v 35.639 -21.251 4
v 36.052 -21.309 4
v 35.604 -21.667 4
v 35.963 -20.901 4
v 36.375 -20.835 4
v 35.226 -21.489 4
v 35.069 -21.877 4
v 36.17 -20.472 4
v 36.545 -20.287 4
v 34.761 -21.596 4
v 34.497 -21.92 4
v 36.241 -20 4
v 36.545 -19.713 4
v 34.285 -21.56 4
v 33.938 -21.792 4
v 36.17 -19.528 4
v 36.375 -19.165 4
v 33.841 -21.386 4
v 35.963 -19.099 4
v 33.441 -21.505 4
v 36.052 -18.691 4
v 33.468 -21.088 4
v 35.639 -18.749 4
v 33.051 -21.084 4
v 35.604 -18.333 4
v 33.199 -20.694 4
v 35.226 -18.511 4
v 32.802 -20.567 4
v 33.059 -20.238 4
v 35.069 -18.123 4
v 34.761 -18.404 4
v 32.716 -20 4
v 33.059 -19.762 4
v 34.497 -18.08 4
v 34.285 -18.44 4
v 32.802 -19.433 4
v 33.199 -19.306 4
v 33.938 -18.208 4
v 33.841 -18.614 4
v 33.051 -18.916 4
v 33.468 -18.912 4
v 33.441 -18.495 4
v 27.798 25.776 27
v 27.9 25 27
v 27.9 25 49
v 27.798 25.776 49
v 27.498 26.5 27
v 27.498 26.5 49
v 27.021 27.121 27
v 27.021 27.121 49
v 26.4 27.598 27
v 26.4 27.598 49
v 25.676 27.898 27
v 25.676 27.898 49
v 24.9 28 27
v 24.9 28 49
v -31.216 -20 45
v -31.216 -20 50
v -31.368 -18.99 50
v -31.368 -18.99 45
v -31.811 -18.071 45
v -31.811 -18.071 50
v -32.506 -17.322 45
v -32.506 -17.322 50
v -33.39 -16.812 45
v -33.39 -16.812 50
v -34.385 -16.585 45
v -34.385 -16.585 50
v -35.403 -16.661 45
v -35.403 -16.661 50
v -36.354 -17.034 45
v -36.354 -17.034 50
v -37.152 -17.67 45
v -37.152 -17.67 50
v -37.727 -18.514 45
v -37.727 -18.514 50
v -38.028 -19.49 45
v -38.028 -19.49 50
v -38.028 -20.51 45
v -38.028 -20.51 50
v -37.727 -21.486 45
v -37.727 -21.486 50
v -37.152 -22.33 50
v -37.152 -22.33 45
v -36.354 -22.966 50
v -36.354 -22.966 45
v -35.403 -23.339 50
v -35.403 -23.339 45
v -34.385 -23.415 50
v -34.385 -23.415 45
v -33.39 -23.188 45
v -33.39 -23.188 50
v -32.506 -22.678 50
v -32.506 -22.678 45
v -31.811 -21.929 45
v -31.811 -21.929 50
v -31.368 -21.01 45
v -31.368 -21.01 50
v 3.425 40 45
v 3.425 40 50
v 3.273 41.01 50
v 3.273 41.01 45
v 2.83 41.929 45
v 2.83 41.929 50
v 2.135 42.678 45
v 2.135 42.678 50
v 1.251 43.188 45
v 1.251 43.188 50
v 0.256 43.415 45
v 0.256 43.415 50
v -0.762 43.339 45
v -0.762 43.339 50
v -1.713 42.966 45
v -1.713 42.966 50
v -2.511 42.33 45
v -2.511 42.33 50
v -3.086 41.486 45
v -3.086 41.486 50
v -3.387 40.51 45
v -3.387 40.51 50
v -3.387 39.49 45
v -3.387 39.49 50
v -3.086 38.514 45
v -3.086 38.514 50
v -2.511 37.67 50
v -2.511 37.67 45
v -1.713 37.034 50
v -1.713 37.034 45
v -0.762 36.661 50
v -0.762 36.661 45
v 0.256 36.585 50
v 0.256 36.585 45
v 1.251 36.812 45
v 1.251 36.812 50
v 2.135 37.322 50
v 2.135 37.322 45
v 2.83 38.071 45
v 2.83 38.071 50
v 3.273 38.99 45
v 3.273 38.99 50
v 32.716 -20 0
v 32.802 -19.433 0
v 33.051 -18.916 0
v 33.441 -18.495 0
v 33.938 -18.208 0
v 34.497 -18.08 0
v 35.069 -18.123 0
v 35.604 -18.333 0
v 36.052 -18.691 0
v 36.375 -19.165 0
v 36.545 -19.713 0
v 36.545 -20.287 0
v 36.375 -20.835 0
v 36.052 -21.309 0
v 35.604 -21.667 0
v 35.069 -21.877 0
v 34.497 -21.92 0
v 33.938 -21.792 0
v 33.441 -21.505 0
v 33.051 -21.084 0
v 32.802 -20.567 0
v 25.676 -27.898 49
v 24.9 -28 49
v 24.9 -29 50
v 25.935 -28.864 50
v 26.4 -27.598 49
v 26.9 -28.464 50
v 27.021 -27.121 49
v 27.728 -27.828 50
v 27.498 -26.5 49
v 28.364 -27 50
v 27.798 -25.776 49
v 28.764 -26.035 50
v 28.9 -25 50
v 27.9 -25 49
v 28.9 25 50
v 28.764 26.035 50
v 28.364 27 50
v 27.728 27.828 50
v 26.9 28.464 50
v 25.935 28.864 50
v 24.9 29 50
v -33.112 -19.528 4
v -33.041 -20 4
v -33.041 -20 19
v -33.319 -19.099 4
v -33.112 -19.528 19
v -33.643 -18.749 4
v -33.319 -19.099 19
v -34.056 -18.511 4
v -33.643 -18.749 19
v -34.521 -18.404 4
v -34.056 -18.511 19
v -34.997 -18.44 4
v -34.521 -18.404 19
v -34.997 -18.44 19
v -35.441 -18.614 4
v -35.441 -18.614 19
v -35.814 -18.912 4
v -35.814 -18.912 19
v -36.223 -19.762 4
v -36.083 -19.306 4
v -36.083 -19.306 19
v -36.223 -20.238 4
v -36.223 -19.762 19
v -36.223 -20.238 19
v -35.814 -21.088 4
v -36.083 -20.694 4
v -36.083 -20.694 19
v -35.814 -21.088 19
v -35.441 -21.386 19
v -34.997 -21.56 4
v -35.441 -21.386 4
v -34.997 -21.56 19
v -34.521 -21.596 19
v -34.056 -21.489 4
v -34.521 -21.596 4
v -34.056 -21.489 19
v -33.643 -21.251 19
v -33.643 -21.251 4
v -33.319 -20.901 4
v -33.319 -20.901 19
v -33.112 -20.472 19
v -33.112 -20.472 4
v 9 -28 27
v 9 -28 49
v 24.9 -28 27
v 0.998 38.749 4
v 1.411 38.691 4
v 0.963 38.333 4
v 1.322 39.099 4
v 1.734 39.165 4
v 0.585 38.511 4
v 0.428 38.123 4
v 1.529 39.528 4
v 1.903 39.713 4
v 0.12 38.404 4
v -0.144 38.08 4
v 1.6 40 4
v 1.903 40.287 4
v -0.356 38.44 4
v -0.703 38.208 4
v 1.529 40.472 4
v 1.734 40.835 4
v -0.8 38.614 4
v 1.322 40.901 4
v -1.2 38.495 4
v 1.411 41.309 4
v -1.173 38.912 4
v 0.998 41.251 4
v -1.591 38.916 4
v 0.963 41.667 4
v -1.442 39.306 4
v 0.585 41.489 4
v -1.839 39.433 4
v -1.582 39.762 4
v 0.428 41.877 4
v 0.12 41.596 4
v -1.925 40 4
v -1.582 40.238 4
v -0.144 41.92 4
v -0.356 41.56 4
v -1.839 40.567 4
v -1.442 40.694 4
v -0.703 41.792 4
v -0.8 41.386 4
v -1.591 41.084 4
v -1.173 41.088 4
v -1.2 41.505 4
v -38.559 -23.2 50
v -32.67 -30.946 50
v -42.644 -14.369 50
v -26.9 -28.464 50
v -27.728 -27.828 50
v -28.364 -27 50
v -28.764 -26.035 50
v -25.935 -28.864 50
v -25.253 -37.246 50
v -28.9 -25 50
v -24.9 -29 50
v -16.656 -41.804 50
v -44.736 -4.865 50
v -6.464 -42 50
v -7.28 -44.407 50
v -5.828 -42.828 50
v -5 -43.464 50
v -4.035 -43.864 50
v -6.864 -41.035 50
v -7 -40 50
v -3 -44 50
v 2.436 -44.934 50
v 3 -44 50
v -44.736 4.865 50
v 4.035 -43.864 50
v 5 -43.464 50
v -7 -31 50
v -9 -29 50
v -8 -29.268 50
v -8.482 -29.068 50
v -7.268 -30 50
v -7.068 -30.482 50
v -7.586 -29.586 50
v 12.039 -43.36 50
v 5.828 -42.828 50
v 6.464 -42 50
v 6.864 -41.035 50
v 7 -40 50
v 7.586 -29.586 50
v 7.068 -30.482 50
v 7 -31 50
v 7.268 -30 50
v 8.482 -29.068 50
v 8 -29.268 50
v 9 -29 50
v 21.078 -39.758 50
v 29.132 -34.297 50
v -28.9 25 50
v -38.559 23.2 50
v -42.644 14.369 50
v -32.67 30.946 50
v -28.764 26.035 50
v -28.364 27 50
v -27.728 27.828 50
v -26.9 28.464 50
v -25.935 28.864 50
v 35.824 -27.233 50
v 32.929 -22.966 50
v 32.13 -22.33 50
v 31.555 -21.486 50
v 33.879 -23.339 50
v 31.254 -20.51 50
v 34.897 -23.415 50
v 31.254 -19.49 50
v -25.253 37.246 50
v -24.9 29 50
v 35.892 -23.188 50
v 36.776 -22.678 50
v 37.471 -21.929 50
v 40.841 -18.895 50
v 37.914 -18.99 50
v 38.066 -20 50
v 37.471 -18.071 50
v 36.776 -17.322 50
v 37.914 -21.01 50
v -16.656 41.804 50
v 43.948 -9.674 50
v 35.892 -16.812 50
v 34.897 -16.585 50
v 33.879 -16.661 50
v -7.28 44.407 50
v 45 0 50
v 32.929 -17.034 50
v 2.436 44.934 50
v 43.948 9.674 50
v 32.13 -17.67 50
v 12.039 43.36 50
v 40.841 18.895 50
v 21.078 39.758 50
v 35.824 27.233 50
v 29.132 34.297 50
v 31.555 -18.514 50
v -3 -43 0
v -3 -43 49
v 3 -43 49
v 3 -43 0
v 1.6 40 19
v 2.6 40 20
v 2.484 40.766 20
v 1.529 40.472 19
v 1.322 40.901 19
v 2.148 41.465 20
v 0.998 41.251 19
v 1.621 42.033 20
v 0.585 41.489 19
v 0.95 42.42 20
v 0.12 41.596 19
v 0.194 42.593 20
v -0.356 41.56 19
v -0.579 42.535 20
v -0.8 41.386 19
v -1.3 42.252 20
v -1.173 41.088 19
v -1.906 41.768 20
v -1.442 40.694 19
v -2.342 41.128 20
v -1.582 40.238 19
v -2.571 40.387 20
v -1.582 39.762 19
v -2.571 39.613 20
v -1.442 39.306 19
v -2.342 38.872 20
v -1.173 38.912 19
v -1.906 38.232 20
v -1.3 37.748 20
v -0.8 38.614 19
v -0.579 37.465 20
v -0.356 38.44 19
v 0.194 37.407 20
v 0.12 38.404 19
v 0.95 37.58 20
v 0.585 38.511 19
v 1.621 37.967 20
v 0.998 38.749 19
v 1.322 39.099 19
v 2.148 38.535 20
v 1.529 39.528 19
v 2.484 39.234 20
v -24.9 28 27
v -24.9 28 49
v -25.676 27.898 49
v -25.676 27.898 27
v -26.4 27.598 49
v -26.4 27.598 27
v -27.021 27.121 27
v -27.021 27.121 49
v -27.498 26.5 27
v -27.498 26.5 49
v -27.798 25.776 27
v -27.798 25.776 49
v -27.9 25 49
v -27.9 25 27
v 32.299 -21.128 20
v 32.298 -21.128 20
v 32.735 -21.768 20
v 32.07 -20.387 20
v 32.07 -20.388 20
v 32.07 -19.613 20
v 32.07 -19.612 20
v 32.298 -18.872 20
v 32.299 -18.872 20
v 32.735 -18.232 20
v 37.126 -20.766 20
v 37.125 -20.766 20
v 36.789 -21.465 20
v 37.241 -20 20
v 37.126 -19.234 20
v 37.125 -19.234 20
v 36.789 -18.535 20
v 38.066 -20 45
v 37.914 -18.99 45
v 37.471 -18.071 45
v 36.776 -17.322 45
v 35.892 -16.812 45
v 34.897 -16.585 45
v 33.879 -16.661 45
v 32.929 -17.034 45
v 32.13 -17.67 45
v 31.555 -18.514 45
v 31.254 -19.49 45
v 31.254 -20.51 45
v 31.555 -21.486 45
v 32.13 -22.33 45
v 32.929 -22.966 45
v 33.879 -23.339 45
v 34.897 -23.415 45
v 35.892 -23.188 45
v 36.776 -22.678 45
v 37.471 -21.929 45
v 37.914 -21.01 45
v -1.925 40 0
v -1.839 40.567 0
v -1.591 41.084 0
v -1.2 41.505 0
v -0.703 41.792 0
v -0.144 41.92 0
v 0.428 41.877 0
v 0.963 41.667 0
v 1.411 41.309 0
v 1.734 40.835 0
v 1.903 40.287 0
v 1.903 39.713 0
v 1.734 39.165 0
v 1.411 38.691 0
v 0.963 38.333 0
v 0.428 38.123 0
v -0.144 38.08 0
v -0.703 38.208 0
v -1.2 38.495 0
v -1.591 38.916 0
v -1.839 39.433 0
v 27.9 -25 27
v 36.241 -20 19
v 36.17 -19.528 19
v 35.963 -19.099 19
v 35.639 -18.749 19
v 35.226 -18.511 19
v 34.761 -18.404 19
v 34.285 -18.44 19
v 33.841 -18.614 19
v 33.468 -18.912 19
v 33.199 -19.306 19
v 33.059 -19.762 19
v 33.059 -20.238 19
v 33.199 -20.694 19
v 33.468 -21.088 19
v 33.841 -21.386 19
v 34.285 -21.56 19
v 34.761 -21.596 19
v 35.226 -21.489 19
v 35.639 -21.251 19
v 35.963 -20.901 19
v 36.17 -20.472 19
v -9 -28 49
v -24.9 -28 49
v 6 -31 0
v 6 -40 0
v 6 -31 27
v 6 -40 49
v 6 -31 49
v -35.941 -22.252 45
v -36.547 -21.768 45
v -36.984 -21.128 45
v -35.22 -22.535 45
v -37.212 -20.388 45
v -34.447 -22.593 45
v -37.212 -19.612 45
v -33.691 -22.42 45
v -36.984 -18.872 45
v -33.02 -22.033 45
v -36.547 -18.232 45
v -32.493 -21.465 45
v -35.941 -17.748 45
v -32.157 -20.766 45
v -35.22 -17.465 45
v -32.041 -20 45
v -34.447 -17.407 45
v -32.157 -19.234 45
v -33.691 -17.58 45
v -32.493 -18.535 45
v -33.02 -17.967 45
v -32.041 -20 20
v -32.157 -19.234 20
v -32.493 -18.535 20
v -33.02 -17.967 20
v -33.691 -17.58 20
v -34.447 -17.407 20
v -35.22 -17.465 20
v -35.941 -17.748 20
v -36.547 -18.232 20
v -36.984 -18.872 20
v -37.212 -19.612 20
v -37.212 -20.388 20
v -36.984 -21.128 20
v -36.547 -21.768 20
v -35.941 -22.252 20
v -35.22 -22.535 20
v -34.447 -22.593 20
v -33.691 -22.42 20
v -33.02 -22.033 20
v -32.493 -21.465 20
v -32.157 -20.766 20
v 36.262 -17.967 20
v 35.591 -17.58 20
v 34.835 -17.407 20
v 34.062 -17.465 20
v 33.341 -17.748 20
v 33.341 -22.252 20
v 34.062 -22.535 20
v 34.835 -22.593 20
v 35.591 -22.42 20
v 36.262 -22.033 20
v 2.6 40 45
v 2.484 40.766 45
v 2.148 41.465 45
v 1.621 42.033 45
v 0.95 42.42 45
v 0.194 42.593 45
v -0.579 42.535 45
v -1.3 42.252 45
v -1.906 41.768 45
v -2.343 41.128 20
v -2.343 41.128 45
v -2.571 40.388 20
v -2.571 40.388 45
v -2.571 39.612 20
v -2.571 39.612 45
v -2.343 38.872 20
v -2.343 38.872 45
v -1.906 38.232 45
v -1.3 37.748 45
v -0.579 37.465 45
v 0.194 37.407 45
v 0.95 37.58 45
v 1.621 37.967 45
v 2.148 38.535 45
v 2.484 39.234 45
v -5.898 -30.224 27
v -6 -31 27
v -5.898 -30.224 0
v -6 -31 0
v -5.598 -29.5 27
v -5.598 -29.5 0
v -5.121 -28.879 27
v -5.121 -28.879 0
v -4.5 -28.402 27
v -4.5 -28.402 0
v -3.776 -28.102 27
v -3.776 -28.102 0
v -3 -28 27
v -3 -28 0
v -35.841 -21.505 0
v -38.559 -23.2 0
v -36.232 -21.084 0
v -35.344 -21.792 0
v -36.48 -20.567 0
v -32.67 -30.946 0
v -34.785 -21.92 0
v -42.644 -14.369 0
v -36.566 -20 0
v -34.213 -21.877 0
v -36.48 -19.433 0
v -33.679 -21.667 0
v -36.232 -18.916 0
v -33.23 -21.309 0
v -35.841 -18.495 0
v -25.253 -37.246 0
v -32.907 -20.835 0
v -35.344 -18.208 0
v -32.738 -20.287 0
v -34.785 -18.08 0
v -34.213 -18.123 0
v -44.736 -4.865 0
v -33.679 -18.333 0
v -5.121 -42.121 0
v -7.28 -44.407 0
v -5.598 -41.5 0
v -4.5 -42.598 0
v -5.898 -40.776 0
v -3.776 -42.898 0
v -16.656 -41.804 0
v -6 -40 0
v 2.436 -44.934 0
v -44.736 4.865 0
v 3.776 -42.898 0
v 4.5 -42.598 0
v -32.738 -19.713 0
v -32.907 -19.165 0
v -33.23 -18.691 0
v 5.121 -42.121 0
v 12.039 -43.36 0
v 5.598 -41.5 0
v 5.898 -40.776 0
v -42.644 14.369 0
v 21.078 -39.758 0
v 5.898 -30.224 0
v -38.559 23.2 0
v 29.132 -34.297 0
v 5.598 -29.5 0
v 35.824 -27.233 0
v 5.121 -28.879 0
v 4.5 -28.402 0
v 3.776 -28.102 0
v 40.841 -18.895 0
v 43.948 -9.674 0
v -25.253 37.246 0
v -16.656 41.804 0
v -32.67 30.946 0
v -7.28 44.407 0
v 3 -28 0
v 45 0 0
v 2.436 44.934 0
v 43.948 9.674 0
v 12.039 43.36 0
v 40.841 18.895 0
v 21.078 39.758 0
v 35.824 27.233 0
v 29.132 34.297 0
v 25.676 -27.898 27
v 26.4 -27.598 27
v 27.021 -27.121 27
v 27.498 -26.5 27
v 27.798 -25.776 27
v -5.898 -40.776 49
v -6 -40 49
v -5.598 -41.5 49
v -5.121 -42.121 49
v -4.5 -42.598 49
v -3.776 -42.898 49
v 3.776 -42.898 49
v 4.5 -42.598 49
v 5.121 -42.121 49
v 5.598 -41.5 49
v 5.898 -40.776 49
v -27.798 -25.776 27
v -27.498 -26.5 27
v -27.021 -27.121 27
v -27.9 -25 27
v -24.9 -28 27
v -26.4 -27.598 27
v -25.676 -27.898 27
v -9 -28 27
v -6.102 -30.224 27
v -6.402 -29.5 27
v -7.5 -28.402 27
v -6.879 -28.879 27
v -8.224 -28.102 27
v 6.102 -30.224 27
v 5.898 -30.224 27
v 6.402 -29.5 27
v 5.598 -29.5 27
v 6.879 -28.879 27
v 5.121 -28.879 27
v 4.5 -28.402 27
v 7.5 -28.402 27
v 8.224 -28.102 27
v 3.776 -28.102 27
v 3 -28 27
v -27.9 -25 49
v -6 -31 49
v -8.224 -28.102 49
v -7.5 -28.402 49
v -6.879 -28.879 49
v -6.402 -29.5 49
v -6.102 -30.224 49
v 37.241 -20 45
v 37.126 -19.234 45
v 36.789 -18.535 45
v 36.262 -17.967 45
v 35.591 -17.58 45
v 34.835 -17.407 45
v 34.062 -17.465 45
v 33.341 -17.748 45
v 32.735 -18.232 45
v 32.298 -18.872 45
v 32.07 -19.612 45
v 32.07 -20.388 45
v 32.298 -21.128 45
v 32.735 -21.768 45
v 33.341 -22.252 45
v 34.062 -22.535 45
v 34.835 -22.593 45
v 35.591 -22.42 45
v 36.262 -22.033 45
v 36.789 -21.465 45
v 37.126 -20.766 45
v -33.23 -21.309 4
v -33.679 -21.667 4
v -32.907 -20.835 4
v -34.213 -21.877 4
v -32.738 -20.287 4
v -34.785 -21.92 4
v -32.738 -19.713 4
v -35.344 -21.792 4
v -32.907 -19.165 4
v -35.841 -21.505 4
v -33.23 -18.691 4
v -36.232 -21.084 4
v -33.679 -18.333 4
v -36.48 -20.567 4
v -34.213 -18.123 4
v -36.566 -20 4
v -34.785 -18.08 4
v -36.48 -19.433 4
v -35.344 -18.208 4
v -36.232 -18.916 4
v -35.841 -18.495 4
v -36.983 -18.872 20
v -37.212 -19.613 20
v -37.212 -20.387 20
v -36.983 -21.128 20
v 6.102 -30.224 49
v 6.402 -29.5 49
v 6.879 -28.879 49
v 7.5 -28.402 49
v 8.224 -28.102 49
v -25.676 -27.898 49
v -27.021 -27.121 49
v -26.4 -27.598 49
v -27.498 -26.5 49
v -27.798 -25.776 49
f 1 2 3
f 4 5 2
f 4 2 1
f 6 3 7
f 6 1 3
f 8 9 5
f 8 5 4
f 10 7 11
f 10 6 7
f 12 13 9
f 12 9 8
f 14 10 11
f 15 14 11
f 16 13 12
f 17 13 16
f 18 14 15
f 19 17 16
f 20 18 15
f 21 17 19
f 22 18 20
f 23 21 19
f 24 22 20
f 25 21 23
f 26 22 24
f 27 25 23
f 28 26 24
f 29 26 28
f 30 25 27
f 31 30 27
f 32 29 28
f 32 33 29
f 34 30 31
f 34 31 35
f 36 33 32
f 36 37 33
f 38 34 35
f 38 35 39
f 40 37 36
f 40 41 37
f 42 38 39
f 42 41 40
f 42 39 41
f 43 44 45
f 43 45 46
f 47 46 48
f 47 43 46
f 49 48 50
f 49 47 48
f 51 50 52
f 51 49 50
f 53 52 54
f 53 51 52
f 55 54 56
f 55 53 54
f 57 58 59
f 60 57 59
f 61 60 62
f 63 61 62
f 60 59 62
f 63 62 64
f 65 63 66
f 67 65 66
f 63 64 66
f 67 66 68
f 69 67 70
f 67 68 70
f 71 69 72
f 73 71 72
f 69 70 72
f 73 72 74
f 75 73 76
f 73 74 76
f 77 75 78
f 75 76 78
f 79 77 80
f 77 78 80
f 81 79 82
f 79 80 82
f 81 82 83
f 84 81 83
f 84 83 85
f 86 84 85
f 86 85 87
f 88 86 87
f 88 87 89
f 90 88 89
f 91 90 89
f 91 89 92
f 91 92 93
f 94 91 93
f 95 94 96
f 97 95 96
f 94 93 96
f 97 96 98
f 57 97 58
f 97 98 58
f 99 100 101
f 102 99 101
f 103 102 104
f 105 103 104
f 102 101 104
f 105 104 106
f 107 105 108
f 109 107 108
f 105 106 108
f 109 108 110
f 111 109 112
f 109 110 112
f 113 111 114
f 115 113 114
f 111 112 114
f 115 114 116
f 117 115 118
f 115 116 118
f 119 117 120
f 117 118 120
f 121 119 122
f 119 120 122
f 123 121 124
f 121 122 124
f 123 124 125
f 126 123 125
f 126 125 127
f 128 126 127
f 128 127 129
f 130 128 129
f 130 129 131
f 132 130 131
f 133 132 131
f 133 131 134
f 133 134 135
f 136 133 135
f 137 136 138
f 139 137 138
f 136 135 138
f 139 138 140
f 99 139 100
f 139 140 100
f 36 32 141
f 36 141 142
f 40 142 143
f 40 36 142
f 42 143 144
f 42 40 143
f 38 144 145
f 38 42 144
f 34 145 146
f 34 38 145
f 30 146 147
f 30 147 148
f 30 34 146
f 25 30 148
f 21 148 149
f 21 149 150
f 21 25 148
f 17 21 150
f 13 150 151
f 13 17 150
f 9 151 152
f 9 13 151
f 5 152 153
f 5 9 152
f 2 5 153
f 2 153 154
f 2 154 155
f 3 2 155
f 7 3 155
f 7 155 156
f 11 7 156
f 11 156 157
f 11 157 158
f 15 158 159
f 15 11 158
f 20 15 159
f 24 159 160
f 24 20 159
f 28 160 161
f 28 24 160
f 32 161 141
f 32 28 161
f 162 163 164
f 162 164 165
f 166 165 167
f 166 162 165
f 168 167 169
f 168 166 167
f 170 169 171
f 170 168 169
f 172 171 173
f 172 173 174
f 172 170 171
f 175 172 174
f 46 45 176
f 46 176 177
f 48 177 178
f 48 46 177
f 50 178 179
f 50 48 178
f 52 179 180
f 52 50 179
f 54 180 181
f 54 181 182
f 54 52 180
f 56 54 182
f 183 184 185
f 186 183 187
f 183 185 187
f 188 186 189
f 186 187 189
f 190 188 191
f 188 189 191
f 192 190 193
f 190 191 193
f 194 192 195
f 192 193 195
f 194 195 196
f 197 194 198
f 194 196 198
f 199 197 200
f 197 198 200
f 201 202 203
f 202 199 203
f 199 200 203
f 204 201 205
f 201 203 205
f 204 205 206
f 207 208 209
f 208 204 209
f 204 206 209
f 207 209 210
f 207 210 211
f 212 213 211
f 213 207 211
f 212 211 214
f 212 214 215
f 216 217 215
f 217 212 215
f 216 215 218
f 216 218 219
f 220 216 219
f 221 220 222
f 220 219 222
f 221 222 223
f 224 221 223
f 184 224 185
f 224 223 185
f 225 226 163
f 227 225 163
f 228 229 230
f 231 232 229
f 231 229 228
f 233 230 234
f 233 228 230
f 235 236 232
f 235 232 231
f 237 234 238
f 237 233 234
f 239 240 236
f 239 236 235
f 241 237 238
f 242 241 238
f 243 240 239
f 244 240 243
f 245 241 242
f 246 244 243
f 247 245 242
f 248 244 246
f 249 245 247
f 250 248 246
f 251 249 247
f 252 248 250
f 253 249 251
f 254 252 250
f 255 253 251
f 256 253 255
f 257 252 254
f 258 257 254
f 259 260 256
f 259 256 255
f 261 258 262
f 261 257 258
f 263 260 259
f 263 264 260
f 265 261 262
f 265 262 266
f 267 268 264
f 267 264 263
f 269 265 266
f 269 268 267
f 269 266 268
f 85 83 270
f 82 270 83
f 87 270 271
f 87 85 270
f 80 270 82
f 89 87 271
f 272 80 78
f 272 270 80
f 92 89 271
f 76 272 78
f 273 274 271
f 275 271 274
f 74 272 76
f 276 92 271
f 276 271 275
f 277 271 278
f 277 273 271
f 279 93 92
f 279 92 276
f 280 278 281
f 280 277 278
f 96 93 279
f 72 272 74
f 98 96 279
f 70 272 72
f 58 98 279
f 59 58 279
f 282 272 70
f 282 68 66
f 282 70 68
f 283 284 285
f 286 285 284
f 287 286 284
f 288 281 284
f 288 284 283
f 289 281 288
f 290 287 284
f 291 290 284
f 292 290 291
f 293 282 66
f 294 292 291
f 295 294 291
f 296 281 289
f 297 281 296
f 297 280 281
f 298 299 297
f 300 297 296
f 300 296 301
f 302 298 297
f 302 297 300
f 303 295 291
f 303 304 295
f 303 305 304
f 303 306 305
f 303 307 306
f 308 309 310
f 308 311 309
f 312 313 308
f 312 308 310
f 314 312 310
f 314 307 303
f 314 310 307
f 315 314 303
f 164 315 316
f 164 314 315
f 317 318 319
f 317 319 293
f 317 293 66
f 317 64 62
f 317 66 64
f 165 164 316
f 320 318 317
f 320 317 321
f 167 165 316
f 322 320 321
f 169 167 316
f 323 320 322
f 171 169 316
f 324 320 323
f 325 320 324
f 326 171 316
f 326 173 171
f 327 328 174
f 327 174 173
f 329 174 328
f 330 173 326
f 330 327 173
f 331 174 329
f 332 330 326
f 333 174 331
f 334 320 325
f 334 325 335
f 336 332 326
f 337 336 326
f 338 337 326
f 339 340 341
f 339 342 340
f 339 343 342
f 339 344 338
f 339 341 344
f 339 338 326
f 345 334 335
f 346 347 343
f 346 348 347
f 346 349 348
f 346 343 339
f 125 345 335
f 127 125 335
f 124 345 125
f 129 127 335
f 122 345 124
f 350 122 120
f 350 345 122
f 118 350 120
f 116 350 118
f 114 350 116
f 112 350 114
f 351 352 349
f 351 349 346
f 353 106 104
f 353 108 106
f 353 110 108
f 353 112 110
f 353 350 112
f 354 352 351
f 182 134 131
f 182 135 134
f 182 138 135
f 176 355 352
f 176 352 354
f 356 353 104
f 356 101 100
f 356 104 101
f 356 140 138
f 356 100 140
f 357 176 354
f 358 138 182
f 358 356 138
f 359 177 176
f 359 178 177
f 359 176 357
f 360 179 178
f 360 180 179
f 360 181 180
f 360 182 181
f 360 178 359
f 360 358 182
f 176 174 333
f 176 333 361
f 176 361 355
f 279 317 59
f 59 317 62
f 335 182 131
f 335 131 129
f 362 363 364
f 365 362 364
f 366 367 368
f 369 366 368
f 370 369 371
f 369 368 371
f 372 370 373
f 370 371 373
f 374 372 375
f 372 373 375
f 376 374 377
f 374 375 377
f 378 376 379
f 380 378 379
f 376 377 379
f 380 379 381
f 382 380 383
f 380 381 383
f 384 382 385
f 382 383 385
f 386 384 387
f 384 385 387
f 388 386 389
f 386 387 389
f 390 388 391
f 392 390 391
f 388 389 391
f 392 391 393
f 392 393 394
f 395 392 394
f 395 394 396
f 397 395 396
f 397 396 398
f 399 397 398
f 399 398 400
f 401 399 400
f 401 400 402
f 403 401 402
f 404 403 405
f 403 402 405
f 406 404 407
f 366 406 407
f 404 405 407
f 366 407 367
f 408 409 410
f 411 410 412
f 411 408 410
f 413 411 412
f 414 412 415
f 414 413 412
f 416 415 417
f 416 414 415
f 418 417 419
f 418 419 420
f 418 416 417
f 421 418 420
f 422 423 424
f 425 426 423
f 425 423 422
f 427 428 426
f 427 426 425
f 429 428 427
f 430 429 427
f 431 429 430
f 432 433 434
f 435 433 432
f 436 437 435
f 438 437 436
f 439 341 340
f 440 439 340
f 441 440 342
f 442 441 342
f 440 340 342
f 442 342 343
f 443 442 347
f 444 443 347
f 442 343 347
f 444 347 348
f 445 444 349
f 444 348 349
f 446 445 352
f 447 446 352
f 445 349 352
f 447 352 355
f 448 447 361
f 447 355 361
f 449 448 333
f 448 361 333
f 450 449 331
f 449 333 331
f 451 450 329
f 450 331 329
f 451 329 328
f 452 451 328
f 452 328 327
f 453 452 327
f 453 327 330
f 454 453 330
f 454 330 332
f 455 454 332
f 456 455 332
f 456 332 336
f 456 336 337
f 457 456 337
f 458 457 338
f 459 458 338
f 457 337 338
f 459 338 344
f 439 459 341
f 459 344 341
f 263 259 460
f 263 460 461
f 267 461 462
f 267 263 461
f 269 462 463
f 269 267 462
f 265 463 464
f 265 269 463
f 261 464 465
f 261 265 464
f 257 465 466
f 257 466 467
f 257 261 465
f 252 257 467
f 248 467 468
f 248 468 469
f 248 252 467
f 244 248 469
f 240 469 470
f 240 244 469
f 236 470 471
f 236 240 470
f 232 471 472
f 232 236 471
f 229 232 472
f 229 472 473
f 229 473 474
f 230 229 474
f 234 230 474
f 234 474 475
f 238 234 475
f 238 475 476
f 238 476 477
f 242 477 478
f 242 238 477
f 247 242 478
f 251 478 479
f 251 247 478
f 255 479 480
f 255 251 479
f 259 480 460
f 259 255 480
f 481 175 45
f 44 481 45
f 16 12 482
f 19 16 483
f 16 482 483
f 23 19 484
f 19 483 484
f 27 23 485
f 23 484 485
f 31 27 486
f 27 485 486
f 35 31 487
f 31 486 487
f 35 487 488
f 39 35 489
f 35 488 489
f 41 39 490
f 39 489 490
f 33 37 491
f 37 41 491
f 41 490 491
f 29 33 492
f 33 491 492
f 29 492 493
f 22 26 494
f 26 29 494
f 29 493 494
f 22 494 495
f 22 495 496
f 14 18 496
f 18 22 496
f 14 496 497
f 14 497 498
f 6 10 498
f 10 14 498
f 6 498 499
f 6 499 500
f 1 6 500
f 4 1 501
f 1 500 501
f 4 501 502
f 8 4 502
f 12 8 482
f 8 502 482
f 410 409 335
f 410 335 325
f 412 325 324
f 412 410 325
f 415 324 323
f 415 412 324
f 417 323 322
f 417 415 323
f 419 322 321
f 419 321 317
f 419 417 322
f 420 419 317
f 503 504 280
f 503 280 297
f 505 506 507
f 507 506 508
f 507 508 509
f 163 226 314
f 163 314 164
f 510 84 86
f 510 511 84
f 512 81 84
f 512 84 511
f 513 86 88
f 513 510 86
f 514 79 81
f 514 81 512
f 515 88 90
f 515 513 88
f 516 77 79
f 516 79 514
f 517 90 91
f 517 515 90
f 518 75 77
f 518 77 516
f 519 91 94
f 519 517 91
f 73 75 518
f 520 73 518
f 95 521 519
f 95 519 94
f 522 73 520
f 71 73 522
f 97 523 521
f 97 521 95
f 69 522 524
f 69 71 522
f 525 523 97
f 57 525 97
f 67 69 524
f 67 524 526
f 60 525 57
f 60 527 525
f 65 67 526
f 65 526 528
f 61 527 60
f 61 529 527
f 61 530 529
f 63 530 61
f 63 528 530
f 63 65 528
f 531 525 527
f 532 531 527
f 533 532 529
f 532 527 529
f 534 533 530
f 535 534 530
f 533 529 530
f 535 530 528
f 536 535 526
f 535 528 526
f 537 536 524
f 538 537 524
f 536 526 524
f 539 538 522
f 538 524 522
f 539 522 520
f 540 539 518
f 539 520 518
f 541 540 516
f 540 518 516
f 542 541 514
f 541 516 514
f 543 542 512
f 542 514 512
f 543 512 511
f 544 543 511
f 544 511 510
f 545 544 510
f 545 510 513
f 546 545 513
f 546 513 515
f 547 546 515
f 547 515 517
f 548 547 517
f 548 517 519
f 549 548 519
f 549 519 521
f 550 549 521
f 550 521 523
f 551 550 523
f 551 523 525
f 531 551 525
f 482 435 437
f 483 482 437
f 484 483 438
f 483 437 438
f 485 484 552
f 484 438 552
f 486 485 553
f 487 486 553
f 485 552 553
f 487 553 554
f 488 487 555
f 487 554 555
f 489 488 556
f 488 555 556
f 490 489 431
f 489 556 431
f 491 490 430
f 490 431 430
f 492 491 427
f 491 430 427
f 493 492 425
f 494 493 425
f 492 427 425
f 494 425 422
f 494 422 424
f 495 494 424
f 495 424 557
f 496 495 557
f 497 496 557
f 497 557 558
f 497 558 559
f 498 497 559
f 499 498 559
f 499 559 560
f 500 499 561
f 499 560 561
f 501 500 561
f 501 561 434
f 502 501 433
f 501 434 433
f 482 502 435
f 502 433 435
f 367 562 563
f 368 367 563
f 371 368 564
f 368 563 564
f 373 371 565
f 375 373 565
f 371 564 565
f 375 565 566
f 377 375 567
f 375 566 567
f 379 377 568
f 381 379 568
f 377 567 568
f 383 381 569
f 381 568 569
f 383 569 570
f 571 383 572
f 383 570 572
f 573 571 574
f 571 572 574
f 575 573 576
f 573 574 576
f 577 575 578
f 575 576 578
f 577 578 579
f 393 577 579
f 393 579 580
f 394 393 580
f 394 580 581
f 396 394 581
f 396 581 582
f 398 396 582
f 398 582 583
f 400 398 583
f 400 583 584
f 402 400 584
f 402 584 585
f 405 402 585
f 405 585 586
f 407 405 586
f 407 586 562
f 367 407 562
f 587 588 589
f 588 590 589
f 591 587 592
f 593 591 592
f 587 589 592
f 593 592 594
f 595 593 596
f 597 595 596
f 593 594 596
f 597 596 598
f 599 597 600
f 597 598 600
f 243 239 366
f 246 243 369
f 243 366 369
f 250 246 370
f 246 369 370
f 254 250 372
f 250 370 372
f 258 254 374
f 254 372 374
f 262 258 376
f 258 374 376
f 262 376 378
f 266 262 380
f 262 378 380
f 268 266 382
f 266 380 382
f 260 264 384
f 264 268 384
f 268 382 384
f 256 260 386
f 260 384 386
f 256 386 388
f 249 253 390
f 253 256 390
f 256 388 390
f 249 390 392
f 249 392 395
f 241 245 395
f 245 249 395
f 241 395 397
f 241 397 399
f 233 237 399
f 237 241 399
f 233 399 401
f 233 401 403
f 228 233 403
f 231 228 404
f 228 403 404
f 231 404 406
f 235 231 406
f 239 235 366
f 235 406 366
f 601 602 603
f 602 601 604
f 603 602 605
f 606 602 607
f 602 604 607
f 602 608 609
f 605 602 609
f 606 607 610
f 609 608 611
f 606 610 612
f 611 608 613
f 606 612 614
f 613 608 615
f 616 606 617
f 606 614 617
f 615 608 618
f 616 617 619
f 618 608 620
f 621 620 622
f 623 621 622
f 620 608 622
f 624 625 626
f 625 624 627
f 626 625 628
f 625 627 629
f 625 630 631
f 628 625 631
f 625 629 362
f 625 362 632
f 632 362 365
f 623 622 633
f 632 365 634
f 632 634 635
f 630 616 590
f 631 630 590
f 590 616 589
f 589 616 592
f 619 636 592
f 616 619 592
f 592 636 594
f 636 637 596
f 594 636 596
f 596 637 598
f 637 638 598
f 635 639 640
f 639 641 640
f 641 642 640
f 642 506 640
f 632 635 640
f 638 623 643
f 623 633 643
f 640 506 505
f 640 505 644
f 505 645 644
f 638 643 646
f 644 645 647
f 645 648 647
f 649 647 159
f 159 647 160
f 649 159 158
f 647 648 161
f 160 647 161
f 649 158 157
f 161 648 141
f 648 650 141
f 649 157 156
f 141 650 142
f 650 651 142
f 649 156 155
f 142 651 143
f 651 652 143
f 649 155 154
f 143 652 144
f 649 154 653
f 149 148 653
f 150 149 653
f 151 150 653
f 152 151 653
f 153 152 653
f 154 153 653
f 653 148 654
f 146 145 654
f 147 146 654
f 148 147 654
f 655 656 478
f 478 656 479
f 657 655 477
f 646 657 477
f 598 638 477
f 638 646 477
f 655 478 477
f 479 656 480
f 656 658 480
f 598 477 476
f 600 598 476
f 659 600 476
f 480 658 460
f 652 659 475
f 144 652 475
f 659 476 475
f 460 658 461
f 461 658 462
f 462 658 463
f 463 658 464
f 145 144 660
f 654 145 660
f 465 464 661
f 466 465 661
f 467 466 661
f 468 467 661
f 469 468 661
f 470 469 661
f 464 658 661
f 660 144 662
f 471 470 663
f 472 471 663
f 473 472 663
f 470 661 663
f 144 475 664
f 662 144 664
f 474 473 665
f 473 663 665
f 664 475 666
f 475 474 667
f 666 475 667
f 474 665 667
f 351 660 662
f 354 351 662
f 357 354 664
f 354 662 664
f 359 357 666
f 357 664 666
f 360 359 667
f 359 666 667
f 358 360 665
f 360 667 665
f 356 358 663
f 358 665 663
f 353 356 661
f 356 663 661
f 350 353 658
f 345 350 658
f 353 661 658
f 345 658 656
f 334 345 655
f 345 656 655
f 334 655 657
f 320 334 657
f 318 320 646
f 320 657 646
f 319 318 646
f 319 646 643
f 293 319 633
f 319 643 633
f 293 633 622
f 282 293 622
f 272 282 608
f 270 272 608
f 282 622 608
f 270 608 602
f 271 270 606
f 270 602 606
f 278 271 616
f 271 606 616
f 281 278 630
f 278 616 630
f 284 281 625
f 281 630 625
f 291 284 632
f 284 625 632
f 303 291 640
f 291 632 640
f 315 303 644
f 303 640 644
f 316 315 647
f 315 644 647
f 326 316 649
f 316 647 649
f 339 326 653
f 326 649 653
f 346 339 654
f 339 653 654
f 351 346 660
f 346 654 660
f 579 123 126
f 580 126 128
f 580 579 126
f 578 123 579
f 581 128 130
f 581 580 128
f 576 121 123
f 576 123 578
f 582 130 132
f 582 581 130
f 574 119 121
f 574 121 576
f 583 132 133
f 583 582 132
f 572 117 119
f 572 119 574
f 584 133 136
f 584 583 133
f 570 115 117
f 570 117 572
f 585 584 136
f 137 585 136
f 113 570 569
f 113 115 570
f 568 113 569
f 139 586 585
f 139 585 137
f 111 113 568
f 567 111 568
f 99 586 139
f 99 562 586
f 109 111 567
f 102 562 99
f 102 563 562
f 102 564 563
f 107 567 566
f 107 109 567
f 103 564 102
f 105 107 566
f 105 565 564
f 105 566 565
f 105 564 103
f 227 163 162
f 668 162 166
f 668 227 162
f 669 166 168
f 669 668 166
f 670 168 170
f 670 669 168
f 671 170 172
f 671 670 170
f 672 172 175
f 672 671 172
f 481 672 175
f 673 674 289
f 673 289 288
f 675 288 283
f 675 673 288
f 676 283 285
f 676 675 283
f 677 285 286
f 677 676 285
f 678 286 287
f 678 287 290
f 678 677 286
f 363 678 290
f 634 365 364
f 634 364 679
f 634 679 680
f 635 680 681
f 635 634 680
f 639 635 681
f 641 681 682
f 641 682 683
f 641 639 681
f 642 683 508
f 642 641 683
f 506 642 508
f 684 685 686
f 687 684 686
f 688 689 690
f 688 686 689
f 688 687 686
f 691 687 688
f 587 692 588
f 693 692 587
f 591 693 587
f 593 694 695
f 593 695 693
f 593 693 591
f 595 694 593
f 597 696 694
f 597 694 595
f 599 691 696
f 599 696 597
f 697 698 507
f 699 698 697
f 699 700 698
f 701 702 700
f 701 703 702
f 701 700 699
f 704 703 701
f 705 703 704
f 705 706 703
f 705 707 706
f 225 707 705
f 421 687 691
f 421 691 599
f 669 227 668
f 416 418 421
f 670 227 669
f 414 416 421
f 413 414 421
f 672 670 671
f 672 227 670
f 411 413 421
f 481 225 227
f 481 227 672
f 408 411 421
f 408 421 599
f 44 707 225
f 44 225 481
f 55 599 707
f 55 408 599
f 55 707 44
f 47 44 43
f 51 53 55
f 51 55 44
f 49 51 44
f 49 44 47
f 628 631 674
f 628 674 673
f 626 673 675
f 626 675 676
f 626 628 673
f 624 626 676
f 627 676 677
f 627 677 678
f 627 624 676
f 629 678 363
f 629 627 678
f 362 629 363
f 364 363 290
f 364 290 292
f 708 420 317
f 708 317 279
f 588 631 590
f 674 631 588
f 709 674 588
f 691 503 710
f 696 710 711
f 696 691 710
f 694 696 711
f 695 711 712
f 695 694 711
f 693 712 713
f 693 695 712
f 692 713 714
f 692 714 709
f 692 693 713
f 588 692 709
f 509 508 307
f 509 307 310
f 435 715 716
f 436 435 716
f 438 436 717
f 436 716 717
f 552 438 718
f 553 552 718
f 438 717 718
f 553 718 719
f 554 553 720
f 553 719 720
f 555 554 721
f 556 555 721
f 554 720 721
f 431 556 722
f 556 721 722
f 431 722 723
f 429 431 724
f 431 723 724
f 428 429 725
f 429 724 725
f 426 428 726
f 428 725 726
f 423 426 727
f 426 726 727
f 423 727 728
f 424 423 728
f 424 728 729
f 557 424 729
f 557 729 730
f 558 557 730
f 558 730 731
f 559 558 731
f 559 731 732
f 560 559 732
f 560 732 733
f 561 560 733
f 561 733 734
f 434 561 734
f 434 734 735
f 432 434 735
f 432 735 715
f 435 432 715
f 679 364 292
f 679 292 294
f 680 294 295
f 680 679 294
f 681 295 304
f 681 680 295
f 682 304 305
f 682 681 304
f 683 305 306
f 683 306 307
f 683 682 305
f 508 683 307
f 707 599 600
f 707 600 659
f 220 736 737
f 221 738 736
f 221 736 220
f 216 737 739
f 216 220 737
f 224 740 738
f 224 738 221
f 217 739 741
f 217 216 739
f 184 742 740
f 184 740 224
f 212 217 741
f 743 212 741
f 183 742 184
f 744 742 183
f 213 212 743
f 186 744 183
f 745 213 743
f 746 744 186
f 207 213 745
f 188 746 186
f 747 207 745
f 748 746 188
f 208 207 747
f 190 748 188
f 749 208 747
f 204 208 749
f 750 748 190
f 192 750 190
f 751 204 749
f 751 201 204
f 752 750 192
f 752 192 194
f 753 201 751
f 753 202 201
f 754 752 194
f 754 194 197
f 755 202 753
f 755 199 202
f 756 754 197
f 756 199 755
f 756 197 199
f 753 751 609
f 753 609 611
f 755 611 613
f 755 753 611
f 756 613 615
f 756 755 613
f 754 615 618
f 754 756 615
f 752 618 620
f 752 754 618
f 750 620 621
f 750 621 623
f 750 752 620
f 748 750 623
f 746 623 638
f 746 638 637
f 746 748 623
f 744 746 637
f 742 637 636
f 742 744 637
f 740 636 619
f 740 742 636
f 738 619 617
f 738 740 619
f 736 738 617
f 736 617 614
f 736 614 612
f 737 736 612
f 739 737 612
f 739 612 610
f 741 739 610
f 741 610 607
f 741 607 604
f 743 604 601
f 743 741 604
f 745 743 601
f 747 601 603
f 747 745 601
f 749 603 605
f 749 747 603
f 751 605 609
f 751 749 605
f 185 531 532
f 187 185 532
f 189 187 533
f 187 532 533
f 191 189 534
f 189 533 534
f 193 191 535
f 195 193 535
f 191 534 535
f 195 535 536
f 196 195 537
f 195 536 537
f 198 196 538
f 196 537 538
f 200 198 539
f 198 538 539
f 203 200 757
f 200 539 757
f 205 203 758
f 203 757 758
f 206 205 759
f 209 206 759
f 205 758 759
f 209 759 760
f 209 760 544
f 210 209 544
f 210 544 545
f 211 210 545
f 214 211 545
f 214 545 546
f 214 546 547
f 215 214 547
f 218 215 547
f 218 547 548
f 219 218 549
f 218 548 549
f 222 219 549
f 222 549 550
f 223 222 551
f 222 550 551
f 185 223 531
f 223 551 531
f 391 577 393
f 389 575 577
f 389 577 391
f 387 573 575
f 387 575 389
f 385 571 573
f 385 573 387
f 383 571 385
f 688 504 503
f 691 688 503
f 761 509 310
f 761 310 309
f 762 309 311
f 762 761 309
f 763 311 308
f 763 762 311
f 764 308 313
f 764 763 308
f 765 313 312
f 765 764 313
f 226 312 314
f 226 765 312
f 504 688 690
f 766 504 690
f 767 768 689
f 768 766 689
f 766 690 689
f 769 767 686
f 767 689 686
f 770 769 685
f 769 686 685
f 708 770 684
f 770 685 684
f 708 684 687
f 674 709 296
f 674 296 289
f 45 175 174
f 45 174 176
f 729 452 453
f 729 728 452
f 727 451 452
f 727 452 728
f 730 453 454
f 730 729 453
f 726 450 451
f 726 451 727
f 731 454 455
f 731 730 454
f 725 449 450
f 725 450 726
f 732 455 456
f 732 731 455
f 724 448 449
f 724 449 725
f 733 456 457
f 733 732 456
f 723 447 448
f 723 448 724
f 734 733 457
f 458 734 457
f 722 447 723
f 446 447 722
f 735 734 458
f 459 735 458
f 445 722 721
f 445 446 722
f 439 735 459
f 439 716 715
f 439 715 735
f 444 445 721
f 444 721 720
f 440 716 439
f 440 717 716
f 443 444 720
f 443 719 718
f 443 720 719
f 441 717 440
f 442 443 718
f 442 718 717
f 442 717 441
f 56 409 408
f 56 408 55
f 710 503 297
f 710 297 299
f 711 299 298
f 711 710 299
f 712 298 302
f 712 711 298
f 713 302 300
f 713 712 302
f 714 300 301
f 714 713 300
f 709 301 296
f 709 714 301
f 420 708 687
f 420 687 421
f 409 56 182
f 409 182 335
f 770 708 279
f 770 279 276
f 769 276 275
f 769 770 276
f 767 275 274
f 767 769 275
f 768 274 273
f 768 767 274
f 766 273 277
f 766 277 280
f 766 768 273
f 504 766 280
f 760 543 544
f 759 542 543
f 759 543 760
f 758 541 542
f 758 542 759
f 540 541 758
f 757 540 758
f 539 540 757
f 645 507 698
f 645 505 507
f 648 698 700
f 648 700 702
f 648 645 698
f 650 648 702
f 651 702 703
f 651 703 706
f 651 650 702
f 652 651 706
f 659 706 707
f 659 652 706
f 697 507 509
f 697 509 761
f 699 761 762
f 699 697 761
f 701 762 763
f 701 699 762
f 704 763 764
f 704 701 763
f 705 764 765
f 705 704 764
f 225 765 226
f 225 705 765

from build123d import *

# Parameters (mm, degrees)
ESQUISSE1_R             = 45
BOSS_EXTRU_1_DEPTH      = 50
ESQUISSE2_W             = 55.8
ESQUISSE2_H             = 56
ENL_V_MAT_EXTRU_1_DEPTH = 23
CONG_1_R                = 3
ESQUISSE3_W             = 12
ESQUISSE3_H             = 15
ENL_V_MAT_EXTRU_2_DEPTH = 81.932070281
CONG_2_R                = 3
CONG_3_R                = 3
CHANFREIN1_SIZE         = 1
ESQUISSE5_R             = 1.6
ENL_V_MAT_EXTRU_3_DEPTH = 81.932070281
ESQUISSE6_R             = 3.425
ESQUISSE6_R_2           = 1.6
ENL_V_MAT_EXTRU_4_DEPTH = 5
ESQUISSE7_R             = 2.6
ESQUISSE7_R_2           = 1.6
ENL_V_MAT_EXTRU_5_DEPTH = 30
CHANFREIN2_SIZE         = 1
ENL_V_START             = -4
ESQUISSE8_R             = 1.925
ESQUISSE8_R_2           = 1.6
ENL_V_MAT_EXTRU_6_DEPTH = 4


with BuildPart() as part:
    # Esquisse1 → Boss.-Extru.1 (new body)
    with BuildSketch(Plane.XY):
        Circle(ESQUISSE1_R)
    extrude(amount=BOSS_EXTRU_1_DEPTH)

    # Esquisse2 → Enlèv. mat.-Extru.1 (cut)
    with BuildSketch(Plane.XY.offset(50)):
        Rectangle(ESQUISSE2_W, ESQUISSE2_H)
    extrude(amount=-ENL_V_MAT_EXTRU_1_DEPTH, mode=Mode.SUBTRACT)

    # Congé1
    cong_1_edges = [part.edges().sort_by_distance(p)[0] for p in [
        (-27.9, -28, 38.5),
        (-27.9, 28, 38.5),
        (27.9, 28, 38.5),
        (27.9, -28, 38.5),
    ]]
    fillet(cong_1_edges, radius=CONG_1_R)

    # Esquisse3 → Enlèv. mat.-Extru.2 (cut, through all)
    with BuildSketch(Plane.XY.offset(50)):
        with Locations((0, -35.5)):
            Rectangle(ESQUISSE3_W, ESQUISSE3_H)
    extrude(amount=-ENL_V_MAT_EXTRU_2_DEPTH, mode=Mode.SUBTRACT)

    # Congé2
    cong_2_edges = [part.edges().sort_by_distance(p)[0] for p in [
        (-6, -28, 38.5),
        (6, -28, 38.5),
        (6, -43, 25),
        (-6, -43, 25),
    ]]
    fillet(cong_2_edges, radius=CONG_2_R)

    # Congé3
    cong_3_edges = [part.edges().sort_by_distance(p)[0] for p in [
        (6, -28, 13.5),
        (-6, -28, 13.5),
    ]]
    fillet(cong_3_edges, radius=CONG_3_R)

    # Chanfrein1
    chanfrein1_edges = [part.edges().sort_by_distance(p)[0] for p in [
        (27.9, 0, 50),
        (-16.95, -28, 50),
        (-27.9, 0, 50),
        (0, 28, 50),
        (27.021320344, -27.121320344, 50),
        (-27.021320344, -27.121320344, 50),
        (-27.021320344, 27.121320344, 50),
        (27.021320344, 27.121320344, 50),
        (16.95, -28, 50),
        (6, -35.5, 50),
        (0, -43, 50),
        (-6, -35.5, 50),
        (-6.878679656, -28.878679656, 50),
        (6.878679656, -28.878679656, 50),
        (5.121320344, -42.121320344, 50),
        (-5.121320344, -42.121320344, 50),
    ]]
    chamfer(chanfrein1_edges, length=CHANFREIN1_SIZE)

    # Esquisse5 → Enlèv. mat.-Extru.3 (cut, through all)
    with BuildSketch(Plane.XY.offset(50)):
        with Locations((-34.641016151, -20)):
            Circle(ESQUISSE5_R)
        with Locations((0, 40)):
            Circle(ESQUISSE5_R)
        with Locations((34.641016151, -20)):
            Circle(ESQUISSE5_R)
    extrude(amount=-ENL_V_MAT_EXTRU_3_DEPTH, mode=Mode.SUBTRACT)

    # Esquisse6 → Enlèv. mat.-Extru.4 (cut)
    # profile 1 of 3: a face of its own
    with BuildSketch(Plane.XY.offset(50)):
        with Locations((-34.641016151, -20)):
            Circle(ESQUISSE6_R)
        with Locations((-34.641016151, -20)):
            Circle(ESQUISSE6_R_2, mode=Mode.SUBTRACT)
    # profile 2 of 3: a face of its own
    with BuildSketch(Plane.XY.offset(50)):
        with Locations((0, 40)):
            Circle(ESQUISSE6_R)
        with Locations((0, 40)):
            Circle(ESQUISSE6_R_2, mode=Mode.SUBTRACT)
    # profile 3 of 3: a face of its own
    with BuildSketch(Plane.XY.offset(50)):
        with Locations((34.641016151, -20)):
            Circle(ESQUISSE6_R)
        with Locations((34.641016151, -20)):
            Circle(ESQUISSE6_R_2, mode=Mode.SUBTRACT)
    extrude(amount=-ENL_V_MAT_EXTRU_4_DEPTH, mode=Mode.SUBTRACT)

    # Esquisse7 → Enlèv. mat.-Extru.5 (cut)
    # profile 1 of 3: a face of its own
    with BuildSketch(Plane.XY.offset(50)):
        with Locations((-34.641016151, -20)):
            Circle(ESQUISSE7_R)
        with Locations((-34.641016151, -20)):
            Circle(ESQUISSE7_R_2, mode=Mode.SUBTRACT)
    # profile 2 of 3: a face of its own
    with BuildSketch(Plane.XY.offset(50)):
        with Locations((0, 40)):
            Circle(ESQUISSE7_R)
        with Locations((0, 40)):
            Circle(ESQUISSE7_R_2, mode=Mode.SUBTRACT)
    # profile 3 of 3: a face of its own
    with BuildSketch(Plane.XY.offset(50)):
        with Locations((34.641016151, -20)):
            Circle(ESQUISSE7_R)
        with Locations((34.641016151, -20)):
            Circle(ESQUISSE7_R_2, mode=Mode.SUBTRACT)
    extrude(amount=-ENL_V_MAT_EXTRU_5_DEPTH, mode=Mode.SUBTRACT)

    # Chanfrein2
    chanfrein2_edges = [part.edges().sort_by_distance(p)[0] for p in [
        (-36.241016151, -20, 20),
        (-1.6, 40, 20),
        (33.041016151, -20, 20),
    ]]
    chamfer(chanfrein2_edges, length=CHANFREIN2_SIZE - 0.0001)  # a hair under: the kernel refuses the full size

    # Esquisse8 → Enlèv. mat.-Extru.6 (cut)
    # profile 1 of 3: a face of its own
    with BuildSketch(Plane(origin=(0, 0, 0), x_dir=(-1, 0, 0), z_dir=(0, 0, -1)).offset(ENL_V_START)):
        with Locations((-34.641016151, -20)):
            Circle(ESQUISSE8_R)
        with Locations(Location((-34.641016151, -20, 0), (0, 0, 180))):
            Circle(ESQUISSE8_R_2, mode=Mode.SUBTRACT)
    # profile 2 of 3: a face of its own
    with BuildSketch(Plane(origin=(0, 0, 0), x_dir=(-1, 0, 0), z_dir=(0, 0, -1)).offset(ENL_V_START)):
        with Locations((0, 40)):
            Circle(ESQUISSE8_R)
        with Locations(Location((0, 40, 0), (0, 0, 180))):
            Circle(ESQUISSE8_R_2, mode=Mode.SUBTRACT)
    # profile 3 of 3: a face of its own
    with BuildSketch(Plane(origin=(0, 0, 0), x_dir=(-1, 0, 0), z_dir=(0, 0, -1)).offset(ENL_V_START)):
        with Locations((34.641016151, -20)):
            Circle(ESQUISSE8_R)
        with Locations(Location((34.641016151, -20, 0), (0, 0, 180))):
            Circle(ESQUISSE8_R_2, mode=Mode.SUBTRACT)
    extrude(amount=ENL_V_MAT_EXTRU_6_DEPTH, mode=Mode.SUBTRACT)


solid = part.part
